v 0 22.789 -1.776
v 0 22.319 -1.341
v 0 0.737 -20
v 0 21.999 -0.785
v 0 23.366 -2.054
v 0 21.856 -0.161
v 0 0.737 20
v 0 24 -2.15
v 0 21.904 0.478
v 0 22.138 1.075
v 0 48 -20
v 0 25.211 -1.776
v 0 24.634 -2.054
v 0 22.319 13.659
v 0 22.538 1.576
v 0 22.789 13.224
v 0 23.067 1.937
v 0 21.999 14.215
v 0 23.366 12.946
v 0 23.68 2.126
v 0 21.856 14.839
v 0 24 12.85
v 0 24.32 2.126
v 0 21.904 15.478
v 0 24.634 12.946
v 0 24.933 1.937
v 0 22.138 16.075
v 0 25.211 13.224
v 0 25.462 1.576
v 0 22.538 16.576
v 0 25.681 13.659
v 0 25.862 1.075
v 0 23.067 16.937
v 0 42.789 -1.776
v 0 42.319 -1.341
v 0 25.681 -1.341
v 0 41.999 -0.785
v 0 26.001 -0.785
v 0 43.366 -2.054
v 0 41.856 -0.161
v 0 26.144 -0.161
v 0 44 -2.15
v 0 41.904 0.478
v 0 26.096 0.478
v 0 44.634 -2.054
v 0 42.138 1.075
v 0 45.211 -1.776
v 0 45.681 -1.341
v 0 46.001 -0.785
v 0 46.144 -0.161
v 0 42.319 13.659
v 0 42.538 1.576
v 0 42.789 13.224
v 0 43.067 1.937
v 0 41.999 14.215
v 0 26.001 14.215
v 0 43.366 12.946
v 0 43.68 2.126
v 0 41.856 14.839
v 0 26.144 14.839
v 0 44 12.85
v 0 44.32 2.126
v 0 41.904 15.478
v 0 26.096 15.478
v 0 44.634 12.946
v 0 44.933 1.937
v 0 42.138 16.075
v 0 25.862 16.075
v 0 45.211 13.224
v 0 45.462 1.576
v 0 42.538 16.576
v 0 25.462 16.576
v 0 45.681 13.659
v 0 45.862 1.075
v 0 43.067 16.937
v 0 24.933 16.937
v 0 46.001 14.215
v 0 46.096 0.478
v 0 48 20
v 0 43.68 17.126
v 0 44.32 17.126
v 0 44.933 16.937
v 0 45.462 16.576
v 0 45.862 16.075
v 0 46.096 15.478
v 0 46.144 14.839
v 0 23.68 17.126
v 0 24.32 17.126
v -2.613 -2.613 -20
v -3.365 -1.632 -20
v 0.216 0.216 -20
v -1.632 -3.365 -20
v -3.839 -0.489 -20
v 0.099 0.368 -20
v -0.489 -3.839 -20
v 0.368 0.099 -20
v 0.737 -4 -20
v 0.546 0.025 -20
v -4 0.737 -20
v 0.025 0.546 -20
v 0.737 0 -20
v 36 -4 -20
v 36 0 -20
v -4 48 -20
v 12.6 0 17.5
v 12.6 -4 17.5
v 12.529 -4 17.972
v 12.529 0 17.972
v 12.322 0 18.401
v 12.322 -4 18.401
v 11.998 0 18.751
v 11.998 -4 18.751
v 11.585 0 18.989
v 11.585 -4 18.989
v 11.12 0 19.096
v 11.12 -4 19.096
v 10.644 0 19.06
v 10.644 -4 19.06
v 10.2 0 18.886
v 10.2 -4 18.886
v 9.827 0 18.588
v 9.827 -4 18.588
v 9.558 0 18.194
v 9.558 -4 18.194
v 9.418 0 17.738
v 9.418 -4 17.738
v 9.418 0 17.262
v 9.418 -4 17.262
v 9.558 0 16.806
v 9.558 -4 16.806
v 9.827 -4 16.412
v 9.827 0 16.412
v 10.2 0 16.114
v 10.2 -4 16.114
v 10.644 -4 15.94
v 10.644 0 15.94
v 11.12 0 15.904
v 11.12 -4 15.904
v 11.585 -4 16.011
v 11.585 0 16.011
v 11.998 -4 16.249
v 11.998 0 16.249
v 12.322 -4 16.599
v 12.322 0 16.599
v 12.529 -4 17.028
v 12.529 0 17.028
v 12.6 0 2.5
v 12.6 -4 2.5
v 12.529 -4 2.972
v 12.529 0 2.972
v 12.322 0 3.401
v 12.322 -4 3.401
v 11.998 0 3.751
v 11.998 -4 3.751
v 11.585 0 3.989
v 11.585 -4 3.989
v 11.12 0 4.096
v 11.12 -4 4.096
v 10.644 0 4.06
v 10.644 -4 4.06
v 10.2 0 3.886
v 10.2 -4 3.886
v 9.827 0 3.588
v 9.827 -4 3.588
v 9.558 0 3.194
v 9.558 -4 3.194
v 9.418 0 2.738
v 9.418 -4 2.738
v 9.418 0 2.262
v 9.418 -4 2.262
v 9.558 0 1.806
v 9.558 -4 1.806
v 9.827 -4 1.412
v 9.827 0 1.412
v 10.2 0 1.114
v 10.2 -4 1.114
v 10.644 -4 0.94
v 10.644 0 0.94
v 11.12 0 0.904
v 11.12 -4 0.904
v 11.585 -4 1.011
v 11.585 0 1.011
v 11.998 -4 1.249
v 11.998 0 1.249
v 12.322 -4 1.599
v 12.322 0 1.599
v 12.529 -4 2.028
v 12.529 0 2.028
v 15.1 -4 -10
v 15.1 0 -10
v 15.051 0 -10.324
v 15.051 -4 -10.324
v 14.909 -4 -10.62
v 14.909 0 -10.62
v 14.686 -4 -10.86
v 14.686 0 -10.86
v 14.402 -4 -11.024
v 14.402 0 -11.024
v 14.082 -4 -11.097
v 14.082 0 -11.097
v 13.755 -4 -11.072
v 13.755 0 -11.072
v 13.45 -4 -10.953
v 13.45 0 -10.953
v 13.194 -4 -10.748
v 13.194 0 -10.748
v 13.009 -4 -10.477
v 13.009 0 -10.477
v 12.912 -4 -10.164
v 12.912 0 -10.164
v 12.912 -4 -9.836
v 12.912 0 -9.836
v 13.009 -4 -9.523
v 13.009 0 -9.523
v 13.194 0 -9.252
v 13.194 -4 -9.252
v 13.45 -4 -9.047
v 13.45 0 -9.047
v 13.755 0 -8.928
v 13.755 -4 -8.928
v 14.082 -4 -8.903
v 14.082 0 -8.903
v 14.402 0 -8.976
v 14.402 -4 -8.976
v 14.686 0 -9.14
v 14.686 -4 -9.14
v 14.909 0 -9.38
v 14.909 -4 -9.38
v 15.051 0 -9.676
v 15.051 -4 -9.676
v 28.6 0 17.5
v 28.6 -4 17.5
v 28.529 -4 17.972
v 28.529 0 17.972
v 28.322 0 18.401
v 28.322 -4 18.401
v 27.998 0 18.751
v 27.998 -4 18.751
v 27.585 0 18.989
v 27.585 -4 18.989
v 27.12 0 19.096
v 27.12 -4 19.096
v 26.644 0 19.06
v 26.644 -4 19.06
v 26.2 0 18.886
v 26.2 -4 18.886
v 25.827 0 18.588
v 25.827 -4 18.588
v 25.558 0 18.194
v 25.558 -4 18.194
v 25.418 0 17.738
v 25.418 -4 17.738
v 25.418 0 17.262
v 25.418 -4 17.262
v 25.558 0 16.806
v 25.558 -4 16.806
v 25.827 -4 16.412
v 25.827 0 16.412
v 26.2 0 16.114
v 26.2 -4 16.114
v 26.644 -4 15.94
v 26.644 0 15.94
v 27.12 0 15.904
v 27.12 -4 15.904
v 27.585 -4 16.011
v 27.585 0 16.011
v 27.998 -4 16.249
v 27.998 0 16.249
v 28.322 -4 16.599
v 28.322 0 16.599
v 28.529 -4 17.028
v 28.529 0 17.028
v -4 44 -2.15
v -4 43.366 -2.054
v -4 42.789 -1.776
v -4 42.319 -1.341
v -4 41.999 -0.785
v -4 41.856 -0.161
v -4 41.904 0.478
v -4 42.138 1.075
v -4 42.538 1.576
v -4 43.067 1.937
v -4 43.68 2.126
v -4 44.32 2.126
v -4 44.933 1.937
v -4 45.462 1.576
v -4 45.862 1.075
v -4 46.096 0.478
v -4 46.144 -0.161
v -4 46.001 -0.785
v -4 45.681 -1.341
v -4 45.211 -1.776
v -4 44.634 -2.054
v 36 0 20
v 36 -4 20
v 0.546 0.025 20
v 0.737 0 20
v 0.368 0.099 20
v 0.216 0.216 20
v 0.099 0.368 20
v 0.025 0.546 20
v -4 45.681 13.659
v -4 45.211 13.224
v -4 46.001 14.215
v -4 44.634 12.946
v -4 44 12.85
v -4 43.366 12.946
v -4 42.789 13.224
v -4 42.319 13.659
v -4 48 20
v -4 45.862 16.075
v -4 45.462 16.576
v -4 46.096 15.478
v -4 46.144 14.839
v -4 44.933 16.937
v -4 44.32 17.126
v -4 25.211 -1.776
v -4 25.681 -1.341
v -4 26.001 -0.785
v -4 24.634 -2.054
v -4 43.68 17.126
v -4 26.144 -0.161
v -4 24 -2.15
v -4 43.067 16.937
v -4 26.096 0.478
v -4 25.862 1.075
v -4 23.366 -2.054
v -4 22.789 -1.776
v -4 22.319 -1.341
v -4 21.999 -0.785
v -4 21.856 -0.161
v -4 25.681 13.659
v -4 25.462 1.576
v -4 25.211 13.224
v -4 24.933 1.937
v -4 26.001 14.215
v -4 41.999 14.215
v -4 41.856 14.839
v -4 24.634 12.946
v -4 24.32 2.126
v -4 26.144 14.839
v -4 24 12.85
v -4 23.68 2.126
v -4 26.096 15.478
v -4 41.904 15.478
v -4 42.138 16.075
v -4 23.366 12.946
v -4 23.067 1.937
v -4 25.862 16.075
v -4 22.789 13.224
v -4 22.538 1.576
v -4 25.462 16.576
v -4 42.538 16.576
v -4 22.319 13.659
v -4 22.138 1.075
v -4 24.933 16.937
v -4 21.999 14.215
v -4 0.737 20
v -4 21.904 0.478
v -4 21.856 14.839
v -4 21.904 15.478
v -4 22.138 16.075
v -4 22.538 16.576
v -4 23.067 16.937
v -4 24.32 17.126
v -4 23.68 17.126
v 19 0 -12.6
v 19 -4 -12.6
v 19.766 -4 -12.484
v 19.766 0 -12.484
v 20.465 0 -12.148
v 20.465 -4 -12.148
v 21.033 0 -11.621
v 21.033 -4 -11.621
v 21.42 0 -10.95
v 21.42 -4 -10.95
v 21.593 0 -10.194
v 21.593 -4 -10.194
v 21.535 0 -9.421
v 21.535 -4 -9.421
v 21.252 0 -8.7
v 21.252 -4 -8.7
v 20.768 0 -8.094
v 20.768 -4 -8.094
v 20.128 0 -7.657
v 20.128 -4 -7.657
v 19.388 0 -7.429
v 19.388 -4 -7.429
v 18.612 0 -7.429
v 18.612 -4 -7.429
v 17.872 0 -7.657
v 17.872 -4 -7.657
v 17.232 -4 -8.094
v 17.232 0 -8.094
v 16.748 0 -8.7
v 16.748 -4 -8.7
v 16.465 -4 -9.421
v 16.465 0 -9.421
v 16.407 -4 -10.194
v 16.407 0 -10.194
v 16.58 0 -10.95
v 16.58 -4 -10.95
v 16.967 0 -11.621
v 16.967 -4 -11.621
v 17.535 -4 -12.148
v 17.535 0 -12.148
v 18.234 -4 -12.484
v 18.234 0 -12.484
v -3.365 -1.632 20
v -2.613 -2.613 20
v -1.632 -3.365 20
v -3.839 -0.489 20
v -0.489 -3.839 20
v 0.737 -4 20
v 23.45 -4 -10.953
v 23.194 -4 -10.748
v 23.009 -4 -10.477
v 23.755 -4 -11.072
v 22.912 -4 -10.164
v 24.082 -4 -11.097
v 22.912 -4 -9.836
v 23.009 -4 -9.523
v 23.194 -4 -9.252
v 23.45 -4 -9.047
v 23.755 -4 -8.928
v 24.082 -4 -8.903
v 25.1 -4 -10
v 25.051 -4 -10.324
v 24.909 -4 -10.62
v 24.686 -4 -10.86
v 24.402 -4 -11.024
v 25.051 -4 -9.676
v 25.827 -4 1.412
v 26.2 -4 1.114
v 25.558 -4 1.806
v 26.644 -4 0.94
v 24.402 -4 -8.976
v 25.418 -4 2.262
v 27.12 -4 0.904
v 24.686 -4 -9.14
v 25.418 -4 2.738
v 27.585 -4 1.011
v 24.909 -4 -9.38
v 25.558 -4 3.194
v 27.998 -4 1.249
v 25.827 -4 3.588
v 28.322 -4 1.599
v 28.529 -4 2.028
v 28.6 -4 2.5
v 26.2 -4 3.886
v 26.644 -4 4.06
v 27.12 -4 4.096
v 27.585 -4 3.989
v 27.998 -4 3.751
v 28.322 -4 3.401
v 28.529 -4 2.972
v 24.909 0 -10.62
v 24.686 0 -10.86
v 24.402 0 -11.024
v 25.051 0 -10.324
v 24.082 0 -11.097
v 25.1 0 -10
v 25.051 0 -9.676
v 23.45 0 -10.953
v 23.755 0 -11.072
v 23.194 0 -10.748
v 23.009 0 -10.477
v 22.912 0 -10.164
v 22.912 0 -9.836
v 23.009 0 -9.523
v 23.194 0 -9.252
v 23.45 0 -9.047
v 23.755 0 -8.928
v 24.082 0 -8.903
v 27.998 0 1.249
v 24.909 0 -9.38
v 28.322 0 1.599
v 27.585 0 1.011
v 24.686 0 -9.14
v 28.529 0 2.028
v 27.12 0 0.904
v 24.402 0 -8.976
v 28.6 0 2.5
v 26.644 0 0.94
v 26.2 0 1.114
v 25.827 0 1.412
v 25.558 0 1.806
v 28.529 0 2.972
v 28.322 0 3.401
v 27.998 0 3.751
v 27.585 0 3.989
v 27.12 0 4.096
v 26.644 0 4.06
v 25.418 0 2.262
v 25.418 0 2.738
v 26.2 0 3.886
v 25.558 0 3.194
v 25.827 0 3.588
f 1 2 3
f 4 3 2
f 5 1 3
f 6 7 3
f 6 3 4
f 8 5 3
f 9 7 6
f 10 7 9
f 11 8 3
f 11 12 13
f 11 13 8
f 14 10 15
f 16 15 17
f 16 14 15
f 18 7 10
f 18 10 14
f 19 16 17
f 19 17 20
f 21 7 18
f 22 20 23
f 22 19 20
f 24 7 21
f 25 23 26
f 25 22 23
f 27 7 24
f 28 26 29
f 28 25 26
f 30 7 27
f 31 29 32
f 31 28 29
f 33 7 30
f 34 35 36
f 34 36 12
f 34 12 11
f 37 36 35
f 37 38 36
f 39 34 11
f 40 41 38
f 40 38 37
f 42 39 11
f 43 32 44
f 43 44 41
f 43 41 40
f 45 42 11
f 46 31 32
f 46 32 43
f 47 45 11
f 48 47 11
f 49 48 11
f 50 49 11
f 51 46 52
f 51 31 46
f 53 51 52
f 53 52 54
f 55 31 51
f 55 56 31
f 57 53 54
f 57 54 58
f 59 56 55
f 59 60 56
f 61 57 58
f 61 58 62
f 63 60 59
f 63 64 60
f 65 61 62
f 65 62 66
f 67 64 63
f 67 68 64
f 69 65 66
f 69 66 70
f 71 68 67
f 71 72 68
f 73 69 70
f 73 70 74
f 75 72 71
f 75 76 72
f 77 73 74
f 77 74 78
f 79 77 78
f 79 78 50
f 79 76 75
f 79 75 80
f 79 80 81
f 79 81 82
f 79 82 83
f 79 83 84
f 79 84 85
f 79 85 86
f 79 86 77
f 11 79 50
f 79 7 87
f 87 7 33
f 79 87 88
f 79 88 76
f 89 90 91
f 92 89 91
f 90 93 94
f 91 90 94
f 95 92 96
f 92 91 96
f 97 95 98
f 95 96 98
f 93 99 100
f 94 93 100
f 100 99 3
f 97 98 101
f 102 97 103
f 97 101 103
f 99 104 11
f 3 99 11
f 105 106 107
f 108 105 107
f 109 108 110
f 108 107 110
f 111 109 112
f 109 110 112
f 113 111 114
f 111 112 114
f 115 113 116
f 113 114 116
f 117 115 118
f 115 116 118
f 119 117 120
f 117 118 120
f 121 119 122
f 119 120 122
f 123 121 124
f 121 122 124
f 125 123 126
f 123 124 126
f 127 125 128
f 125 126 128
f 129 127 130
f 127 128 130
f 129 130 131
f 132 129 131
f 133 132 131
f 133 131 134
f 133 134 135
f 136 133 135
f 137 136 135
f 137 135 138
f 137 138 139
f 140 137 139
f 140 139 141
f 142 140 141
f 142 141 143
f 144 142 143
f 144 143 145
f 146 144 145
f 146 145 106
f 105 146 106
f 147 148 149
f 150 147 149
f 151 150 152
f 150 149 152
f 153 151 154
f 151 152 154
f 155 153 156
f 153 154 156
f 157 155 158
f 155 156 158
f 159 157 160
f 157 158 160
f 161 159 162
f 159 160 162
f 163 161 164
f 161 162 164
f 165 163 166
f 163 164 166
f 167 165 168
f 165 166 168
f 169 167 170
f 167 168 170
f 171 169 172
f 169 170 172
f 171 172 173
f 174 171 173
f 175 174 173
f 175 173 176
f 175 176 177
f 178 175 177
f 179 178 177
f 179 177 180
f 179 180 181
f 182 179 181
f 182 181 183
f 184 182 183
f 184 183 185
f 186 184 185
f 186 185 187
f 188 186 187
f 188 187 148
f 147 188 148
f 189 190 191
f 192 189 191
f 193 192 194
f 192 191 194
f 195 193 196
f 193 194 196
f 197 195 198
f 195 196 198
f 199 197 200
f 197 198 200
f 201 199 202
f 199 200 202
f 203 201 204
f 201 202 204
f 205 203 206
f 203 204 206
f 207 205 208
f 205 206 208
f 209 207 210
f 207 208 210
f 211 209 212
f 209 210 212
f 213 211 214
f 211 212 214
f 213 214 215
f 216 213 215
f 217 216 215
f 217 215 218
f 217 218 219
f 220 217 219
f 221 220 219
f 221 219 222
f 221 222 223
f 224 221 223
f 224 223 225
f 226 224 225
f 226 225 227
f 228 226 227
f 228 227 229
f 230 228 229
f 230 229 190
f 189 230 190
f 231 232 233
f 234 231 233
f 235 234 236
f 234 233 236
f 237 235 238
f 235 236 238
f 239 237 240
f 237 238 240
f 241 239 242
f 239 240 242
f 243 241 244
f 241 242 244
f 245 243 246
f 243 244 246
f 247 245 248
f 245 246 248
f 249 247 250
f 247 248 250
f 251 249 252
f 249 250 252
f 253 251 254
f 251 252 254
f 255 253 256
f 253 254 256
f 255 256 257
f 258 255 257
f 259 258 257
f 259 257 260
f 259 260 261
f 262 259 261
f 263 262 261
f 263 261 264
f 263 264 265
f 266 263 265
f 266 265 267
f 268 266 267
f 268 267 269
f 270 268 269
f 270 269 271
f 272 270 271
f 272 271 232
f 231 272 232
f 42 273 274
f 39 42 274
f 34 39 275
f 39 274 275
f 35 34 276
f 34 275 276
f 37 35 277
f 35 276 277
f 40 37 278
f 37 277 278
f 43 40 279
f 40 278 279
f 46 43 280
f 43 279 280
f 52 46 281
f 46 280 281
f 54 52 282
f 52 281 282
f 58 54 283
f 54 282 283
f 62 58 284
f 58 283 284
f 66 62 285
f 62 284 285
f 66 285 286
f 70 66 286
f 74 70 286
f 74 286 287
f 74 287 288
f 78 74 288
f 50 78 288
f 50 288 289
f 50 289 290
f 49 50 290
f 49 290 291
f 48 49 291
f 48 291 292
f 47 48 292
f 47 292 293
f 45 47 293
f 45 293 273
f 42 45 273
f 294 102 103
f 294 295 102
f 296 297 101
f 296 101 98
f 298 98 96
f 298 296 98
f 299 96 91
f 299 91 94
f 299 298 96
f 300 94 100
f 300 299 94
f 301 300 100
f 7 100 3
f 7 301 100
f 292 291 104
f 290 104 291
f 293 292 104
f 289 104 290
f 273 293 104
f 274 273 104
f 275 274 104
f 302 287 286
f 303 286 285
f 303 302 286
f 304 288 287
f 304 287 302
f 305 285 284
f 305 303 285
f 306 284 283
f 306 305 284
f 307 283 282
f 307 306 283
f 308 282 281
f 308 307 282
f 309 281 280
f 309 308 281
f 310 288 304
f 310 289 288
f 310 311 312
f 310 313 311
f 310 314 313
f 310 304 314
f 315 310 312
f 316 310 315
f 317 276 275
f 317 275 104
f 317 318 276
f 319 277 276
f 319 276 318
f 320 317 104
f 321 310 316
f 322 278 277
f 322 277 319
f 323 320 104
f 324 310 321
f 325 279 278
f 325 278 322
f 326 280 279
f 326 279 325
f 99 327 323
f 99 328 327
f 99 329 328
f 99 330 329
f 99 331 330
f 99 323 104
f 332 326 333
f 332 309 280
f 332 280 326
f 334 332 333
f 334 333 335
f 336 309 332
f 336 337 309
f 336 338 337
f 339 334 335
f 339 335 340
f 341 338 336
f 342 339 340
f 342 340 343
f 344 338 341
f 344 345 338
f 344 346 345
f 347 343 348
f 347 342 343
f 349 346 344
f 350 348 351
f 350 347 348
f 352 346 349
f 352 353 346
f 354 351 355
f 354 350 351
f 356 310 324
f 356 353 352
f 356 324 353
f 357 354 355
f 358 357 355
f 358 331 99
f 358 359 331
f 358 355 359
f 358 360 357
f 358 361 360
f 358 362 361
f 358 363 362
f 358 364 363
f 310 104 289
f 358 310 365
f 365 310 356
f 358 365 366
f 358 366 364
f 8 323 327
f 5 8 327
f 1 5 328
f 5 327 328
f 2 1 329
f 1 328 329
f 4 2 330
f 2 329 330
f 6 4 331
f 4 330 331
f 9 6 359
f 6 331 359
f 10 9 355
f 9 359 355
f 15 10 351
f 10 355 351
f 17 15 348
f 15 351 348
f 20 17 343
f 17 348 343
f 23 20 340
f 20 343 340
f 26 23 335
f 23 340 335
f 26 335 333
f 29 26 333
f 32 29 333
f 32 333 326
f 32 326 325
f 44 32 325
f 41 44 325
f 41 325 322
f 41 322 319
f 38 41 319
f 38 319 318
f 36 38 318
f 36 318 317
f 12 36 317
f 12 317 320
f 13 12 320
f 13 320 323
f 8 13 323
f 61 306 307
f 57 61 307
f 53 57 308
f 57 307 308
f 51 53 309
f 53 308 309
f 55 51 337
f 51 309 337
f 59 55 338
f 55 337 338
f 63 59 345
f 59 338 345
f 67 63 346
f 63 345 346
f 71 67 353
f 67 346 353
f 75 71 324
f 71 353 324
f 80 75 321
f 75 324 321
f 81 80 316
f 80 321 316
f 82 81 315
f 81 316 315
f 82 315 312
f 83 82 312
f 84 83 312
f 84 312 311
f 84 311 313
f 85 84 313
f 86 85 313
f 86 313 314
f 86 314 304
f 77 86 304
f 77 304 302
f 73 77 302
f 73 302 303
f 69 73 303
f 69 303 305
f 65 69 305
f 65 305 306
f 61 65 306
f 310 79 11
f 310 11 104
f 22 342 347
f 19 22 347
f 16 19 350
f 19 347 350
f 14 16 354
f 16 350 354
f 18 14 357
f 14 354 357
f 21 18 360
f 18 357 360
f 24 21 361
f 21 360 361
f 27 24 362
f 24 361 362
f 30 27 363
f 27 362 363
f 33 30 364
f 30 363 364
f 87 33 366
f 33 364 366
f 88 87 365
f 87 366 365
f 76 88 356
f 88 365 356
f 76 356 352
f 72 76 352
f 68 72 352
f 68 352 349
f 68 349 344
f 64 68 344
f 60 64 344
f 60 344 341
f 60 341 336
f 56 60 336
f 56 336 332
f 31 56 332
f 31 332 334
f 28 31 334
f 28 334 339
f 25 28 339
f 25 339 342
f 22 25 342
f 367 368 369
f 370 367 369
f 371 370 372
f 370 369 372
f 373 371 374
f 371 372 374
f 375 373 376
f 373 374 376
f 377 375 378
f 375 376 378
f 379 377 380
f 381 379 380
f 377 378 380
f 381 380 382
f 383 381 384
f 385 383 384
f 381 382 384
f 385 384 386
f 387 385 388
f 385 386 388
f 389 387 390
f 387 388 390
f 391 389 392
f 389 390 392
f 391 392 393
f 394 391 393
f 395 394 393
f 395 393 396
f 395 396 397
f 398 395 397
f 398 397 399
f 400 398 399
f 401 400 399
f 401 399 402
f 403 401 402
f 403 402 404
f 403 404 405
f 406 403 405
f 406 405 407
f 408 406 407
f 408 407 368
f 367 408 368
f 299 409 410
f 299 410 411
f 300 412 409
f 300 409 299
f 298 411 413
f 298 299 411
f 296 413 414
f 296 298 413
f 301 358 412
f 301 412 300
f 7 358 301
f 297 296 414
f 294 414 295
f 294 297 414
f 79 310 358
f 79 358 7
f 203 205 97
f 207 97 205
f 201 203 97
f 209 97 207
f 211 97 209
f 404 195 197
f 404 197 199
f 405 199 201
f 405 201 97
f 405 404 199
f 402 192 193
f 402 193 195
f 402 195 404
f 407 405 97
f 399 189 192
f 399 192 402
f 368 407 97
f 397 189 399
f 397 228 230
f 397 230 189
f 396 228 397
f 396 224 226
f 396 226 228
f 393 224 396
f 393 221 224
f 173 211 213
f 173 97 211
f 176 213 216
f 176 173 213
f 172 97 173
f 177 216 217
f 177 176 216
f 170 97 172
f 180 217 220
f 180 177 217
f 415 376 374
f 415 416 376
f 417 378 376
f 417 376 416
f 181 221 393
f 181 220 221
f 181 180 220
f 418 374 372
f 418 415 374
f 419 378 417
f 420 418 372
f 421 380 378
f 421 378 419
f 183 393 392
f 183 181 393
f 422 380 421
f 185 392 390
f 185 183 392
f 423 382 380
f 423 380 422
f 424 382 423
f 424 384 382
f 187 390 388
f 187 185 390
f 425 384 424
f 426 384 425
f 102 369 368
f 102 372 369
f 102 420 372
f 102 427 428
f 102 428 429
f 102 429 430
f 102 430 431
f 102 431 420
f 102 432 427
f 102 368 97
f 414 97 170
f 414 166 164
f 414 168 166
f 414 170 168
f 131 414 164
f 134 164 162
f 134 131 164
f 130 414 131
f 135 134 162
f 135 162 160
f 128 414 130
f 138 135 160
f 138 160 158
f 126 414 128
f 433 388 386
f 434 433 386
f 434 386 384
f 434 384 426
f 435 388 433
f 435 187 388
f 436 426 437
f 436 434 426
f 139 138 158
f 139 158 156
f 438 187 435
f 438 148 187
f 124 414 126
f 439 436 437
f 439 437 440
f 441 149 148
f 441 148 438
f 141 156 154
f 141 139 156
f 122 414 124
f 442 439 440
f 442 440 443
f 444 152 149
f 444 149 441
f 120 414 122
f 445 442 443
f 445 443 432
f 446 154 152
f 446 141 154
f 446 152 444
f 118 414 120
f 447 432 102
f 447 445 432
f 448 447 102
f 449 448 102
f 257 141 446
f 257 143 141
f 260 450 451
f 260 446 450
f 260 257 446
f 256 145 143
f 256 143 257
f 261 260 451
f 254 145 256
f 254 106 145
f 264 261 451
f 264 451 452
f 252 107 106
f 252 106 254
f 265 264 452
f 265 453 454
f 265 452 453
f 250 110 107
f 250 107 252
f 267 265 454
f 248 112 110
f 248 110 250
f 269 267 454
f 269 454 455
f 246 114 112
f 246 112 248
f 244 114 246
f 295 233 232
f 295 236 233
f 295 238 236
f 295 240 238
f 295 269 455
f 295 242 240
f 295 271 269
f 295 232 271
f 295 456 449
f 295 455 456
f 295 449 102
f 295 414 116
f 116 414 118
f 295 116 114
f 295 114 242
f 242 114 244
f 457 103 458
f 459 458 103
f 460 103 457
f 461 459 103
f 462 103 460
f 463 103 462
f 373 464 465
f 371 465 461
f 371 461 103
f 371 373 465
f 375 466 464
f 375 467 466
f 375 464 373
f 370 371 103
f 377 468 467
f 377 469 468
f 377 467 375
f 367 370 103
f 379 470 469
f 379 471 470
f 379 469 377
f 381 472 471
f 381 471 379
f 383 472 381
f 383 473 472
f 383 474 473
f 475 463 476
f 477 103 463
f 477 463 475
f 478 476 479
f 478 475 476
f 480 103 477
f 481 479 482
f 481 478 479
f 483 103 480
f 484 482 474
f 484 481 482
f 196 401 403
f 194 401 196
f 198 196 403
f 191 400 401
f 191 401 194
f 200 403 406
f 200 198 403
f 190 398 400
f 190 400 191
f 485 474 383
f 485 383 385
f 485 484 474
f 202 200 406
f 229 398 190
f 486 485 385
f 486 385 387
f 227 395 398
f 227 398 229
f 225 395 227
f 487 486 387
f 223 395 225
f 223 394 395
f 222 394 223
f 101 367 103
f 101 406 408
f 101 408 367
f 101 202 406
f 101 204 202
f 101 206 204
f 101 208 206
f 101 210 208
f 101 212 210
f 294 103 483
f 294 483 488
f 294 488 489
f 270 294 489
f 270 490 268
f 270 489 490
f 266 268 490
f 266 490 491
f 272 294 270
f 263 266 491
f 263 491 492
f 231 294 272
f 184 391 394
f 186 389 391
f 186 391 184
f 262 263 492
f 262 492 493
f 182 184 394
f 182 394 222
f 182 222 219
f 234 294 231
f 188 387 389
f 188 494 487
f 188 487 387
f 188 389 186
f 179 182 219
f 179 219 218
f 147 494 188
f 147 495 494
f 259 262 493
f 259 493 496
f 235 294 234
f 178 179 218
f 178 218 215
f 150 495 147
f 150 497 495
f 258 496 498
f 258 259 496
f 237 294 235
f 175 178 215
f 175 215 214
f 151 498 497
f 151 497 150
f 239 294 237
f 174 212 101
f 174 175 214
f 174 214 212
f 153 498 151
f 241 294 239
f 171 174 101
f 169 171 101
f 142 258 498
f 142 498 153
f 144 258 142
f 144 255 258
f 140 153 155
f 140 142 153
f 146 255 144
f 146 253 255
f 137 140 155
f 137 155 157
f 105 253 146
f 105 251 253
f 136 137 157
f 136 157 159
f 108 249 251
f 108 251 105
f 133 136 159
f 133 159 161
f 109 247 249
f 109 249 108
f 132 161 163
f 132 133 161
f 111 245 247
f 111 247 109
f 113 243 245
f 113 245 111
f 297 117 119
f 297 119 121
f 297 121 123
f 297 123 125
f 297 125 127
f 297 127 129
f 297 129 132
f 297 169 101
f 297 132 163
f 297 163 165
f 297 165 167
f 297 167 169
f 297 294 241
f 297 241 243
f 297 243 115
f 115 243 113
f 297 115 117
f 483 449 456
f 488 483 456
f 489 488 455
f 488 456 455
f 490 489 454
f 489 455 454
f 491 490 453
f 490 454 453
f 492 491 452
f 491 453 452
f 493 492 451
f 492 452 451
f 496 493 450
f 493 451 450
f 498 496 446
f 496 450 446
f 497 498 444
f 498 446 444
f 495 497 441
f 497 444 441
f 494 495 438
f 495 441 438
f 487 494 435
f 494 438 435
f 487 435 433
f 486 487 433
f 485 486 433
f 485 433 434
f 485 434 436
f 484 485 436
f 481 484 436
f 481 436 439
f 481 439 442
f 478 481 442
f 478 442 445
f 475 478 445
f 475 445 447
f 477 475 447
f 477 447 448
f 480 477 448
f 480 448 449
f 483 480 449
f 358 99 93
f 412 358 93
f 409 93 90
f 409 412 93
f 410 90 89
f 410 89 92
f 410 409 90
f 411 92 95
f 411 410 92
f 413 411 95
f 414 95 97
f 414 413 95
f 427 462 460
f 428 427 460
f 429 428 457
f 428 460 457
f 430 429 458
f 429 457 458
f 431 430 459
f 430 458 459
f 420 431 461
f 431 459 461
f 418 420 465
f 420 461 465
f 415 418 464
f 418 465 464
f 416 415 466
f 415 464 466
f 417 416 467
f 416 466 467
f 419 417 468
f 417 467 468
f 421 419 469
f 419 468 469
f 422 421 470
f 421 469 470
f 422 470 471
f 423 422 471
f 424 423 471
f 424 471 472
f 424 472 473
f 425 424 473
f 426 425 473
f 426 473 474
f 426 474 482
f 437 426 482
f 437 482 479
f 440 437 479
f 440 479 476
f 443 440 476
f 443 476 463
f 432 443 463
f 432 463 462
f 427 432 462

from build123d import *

# Parameters (mm, degrees)
SM_BASE_FLANGE_2_DEPTH = 20
HOLE_WIZARD_M3_1_D     = 3.2
SKETCH_24_R            = 2.6
CUT_EXTRUDE_2_DEPTH    = 67.332495807
HOLE_WIZARD_M4_1_D     = 4.3
HOLE_WIZARD_M2_1_D     = 2.2


# Sheet-metal steps are written as plain solids
with BuildPart() as part:
    # 草圖16 → 基材-凸緣2 (new, symmetric)
    with BuildSketch(Plane.XY):
        with BuildLine():
            Line((36, 0), (0.7366, 0))
            ThreePointArc((0.7366, 0), (0.215745145, 0.215745145), (0, 0.7366))
            Line((0, 0.7366), (0, 48))
            Line((0, 48), (-4, 48))
            Line((-4, 48), (-4, 0.7366))
            ThreePointArc((-4, 0.7366), (-2.61268198, -2.61268198), (0.7366, -4))
            Line((0.7366, -4), (36, -4))
            Line((36, -4), (36, 0))
        make_face()
    extrude(amount=SM_BASE_FLANGE_2_DEPTH, both=True)

    # M3 餘隙孔1 (through all)
    with Locations(Plane(origin=(0, 0, 0), x_dir=(-1, 0, 0), z_dir=(0, 1, 0))):
        with Locations((-27, 17.5), (-11, 2.5), (-11, 17.5), (-27, 2.5)):
            Hole(HOLE_WIZARD_M3_1_D / 2)

    # 草圖24 → 除料-伸長2 (cut, through all)
    with BuildSketch(Plane.XZ.offset(4)):
        with Locations(Location((19, -10, 0), (0, 0, 270))):
            Circle(SKETCH_24_R)
    extrude(amount=-CUT_EXTRUDE_2_DEPTH, mode=Mode.SUBTRACT)

    # M4 餘隙孔1 (through all)
    with Locations(Plane(origin=(0, 0, 0), x_dir=(0, 0, 1), z_dir=(1, 0, 0))):
        with Locations((0, -44), (15, -44), (15, -24), (0, -24)):
            Hole(HOLE_WIZARD_M4_1_D / 2)

    # M2 餘隙孔1 (through all)
    with Locations(Plane(origin=(0, -4, 0), x_dir=(-1, 0, 0), z_dir=(0, -1, 0))):
        with Locations((-14, 10), (-24, 10)):
            Hole(HOLE_WIZARD_M2_1_D / 2)


solid = part.part
